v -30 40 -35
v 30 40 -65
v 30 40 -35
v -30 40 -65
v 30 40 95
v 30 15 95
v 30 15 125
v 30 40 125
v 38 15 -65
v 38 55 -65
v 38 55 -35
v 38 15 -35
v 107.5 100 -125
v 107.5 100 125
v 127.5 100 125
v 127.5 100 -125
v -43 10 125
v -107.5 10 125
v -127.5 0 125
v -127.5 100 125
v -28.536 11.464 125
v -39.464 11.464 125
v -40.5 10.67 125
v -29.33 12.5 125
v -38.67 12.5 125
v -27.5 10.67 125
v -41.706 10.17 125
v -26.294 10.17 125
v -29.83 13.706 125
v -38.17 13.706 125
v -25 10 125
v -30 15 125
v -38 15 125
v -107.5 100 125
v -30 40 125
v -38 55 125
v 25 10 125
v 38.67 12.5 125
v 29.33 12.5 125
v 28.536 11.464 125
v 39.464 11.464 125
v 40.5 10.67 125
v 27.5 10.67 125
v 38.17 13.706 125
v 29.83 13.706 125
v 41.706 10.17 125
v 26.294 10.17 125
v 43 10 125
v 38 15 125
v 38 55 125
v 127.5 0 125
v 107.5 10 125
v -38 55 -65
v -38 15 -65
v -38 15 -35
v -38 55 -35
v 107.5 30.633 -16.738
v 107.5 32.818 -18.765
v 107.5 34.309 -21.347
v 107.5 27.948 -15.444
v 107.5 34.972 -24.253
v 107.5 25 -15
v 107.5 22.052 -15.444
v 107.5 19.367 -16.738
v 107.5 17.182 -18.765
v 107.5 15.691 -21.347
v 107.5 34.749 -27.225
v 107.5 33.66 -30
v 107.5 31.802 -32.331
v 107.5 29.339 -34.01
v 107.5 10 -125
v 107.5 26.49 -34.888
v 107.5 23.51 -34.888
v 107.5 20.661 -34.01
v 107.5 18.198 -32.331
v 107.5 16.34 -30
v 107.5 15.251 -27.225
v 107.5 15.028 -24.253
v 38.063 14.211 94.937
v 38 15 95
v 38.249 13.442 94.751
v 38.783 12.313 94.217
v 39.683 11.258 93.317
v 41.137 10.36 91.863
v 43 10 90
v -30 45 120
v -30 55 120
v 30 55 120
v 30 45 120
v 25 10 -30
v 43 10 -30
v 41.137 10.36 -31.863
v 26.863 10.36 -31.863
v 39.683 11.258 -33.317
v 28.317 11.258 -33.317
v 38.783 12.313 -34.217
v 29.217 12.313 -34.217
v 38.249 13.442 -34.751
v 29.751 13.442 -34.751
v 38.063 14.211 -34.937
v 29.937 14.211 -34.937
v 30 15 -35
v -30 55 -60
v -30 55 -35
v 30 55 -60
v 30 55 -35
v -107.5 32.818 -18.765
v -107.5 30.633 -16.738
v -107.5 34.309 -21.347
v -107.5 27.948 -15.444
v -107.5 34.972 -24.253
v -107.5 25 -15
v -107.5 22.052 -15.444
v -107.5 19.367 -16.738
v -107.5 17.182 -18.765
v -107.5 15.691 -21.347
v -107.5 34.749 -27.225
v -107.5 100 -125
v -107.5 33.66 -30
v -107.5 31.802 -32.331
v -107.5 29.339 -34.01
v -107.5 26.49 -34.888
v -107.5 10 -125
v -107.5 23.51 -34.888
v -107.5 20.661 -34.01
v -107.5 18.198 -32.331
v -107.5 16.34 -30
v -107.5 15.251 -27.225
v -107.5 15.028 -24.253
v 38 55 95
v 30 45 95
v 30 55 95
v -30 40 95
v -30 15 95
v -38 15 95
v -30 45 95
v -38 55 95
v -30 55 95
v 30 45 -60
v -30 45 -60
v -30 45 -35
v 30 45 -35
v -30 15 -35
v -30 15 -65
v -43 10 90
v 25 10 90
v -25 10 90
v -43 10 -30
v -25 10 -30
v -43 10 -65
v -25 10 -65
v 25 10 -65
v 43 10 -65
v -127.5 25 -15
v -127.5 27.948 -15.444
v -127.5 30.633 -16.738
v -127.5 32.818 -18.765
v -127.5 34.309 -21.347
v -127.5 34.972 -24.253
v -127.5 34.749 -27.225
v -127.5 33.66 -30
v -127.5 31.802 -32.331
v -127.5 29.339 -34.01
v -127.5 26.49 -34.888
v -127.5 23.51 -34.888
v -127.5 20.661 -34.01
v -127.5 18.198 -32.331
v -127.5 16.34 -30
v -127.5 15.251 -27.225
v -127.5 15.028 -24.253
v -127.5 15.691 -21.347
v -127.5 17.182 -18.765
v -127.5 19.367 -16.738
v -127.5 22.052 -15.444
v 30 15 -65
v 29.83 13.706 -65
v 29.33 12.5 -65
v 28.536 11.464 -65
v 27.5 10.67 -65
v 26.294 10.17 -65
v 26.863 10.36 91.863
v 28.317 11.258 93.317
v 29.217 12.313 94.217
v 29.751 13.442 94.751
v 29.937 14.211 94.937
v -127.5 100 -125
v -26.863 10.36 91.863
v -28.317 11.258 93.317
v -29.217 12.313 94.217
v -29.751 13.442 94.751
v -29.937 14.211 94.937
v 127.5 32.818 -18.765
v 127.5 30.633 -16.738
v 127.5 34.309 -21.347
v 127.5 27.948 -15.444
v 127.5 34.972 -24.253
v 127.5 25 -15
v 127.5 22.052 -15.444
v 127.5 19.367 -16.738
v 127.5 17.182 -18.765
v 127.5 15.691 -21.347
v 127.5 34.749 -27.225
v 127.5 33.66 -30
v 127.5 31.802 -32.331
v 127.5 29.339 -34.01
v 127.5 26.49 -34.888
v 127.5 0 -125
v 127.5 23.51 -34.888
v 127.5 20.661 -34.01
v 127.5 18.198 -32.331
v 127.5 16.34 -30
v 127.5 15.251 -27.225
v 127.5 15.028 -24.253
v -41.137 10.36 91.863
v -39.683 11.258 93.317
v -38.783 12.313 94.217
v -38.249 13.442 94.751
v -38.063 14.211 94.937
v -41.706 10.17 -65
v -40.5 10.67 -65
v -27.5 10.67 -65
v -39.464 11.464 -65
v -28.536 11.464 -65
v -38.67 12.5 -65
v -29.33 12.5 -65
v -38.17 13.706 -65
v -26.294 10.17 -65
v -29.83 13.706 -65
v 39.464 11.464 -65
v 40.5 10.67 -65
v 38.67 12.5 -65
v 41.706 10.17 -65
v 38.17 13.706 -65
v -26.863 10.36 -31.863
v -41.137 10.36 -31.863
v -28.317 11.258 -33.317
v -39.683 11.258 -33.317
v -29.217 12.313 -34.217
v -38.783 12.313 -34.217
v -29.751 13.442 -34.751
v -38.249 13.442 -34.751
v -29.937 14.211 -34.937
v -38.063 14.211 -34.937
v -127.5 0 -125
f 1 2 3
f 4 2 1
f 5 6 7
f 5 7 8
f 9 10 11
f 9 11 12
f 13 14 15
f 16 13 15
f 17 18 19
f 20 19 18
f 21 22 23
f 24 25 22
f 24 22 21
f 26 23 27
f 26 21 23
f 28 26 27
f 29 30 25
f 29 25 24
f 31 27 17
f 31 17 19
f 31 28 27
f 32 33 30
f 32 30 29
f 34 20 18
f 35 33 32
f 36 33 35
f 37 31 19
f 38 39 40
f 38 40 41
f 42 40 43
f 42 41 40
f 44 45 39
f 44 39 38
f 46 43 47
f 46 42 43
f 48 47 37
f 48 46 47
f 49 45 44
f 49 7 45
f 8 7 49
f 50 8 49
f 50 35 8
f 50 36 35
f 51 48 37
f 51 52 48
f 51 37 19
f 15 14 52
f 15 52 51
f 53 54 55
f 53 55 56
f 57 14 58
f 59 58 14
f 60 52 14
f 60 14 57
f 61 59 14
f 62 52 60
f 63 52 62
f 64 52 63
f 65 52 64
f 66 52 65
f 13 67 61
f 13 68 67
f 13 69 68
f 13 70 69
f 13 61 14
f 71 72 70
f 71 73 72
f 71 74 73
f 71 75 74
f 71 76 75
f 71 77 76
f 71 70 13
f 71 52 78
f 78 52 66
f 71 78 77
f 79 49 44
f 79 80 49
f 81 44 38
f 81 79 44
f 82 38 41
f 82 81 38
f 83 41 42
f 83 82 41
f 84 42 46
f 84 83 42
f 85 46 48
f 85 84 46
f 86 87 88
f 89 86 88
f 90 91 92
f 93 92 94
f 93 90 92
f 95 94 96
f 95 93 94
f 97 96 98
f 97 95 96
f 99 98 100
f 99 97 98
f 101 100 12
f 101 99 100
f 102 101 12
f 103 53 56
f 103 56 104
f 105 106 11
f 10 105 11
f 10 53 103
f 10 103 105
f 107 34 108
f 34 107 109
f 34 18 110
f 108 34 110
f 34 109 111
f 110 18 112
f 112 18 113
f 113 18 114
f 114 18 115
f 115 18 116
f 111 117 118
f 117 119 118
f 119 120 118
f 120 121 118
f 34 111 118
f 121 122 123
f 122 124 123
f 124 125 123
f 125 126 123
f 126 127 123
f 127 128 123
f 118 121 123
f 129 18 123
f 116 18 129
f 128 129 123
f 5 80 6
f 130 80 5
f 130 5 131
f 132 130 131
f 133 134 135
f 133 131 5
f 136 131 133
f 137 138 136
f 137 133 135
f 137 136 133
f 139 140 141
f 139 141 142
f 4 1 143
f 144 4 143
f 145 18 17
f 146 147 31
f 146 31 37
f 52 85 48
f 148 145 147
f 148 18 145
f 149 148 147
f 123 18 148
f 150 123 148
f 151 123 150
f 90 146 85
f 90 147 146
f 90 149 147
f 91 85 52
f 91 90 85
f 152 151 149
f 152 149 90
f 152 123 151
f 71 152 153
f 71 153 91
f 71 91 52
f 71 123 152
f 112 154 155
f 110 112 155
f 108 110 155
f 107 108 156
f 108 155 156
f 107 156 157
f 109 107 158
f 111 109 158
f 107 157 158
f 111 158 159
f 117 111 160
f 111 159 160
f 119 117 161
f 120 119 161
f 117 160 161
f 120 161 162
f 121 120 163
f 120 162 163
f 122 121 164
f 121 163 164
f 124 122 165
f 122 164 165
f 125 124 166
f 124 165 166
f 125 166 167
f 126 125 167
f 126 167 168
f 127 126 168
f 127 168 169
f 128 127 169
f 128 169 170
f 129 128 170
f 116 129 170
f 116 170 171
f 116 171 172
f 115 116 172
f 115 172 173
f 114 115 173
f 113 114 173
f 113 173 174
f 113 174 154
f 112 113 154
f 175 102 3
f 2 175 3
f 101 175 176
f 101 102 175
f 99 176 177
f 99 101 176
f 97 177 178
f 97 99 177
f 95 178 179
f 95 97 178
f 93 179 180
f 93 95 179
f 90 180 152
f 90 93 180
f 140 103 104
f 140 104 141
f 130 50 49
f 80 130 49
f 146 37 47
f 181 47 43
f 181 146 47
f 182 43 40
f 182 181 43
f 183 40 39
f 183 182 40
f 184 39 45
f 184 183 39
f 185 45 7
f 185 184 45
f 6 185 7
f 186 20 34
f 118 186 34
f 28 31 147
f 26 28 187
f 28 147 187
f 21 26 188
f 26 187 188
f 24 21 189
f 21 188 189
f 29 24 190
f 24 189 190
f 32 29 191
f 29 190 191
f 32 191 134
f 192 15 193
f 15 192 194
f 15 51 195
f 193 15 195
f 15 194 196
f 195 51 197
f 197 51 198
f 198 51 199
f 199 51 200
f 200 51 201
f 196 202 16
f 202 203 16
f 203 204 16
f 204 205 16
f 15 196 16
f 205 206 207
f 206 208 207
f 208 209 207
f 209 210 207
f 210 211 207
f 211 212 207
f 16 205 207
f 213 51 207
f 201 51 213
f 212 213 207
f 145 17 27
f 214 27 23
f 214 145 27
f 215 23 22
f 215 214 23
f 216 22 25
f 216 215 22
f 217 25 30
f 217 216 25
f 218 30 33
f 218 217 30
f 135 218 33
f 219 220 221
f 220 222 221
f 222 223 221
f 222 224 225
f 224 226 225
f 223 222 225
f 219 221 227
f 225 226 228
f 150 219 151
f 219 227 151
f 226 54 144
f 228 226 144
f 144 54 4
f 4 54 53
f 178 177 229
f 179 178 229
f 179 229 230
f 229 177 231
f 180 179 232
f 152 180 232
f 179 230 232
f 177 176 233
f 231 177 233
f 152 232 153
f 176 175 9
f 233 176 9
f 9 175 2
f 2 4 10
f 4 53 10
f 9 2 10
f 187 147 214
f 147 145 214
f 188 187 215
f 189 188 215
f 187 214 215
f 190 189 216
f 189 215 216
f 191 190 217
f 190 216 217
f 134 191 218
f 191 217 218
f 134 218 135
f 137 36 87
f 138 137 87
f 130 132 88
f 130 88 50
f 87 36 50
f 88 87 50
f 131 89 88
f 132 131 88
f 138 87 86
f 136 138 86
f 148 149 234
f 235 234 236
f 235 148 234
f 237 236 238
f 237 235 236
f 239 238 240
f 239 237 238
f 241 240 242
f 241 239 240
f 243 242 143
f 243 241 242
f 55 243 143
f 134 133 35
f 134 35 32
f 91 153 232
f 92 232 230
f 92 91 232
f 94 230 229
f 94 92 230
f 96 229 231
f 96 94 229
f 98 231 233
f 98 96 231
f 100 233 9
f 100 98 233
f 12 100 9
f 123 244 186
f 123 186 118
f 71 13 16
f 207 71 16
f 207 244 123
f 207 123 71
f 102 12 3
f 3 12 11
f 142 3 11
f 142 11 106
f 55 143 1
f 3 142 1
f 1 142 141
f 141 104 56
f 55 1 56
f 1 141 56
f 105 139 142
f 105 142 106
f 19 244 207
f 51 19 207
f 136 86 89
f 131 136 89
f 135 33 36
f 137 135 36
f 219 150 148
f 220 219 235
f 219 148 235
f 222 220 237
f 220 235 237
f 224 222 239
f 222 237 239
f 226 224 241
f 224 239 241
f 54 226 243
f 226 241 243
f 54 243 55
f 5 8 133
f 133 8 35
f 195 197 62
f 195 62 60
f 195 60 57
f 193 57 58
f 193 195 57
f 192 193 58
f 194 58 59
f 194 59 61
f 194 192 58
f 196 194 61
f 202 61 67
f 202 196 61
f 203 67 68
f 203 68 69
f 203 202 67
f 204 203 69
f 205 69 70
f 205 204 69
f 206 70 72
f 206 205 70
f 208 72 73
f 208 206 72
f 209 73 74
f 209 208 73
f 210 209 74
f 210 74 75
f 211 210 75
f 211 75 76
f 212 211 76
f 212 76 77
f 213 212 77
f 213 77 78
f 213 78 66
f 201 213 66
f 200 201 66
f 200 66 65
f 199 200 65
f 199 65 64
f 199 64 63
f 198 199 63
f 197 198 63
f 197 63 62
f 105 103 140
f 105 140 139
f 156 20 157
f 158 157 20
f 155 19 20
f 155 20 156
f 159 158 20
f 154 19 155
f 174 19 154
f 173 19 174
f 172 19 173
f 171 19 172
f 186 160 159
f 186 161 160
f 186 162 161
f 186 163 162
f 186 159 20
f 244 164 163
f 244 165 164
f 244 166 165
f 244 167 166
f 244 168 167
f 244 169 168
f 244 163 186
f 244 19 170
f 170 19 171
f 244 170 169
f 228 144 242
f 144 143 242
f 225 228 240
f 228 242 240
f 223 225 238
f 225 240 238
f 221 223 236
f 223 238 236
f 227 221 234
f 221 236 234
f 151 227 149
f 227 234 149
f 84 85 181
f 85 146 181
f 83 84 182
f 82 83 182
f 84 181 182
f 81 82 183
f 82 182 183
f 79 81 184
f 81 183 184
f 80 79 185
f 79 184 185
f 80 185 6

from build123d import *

# Parameters (mm, degrees)
SKETCH_4_W             = 255
SKETCH_4_H             = 250
EXTRUDE_2_DEPTH        = 10
SKETCH_7_W             = 20
SKETCH_7_H             = 250
EXTRUDE_3_DEPTH        = 90
EXTRUDE_4_DEPTH        = 30
CUT_EXTRUDE_1_REACH    = 303.081
SKETCH_9_R             = 10
SKETCH_11_W            = 60
SKETCH_11_H            = 10
EXTRUDE_6_DEPTH        = 5
FILLET_1_R             = 5
FILLET_1_OF_MIRROR_2_R = 5


with BuildPart() as part:
    # 草圖4 → 填料-伸長2 (new body)
    with BuildSketch(Plane(origin=(0, 0, 0), x_dir=(1, 0, 0), z_dir=(0, 1, 0))):
        Rectangle(SKETCH_4_W, SKETCH_4_H)
    extrude(amount=EXTRUDE_2_DEPTH)

    # 草圖7 → 填料-伸長3 (add)
    with BuildSketch(Plane(origin=(0, 10, 0), x_dir=(1, 0, 0), z_dir=(0, 1, 0))):
        with Locations((-117.5, 0)):
            Rectangle(SKETCH_7_W, SKETCH_7_H)
        with Locations((117.5, 0)):
            Rectangle(SKETCH_7_W, SKETCH_7_H)
    extrude(amount=EXTRUDE_3_DEPTH)

    # 草圖8 → 填料-伸長4 (add)
    with BuildSketch(Plane.XY.offset(125)):
        Polygon((-30, 10), (-38, 10), (-38, 55), (-30, 55), (-30, 45), (30, 45), (30, 55), (38, 55), (38, 10), (30, 10), (30, 40), (-30, 40), align=None)
    extrude_4 = extrude(amount=-EXTRUDE_4_DEPTH)

    # 草圖9 → 除料-伸長1 (cut, up to next)
    with BuildSketch(Plane.ZY.offset(127.5), mode=Mode.PRIVATE) as cut_extrude_1_sk1:
        with Locations((-25, 25)):
            Circle(SKETCH_9_R)
    cut_extrude_1_tool1 = extrude(cut_extrude_1_sk1.sketch, amount=-CUT_EXTRUDE_1_REACH, mode=Mode.PRIVATE) & part.part
    cut_extrude_1 = cut_extrude_1_tool1.solids().sort_by_distance((-127.5, 25, -25))[0]
    add(cut_extrude_1, mode=Mode.SUBTRACT)

    # 鏡射1: 除料-伸長1 across plane
    add(cut_extrude_1.mirror(Plane(origin=(0, 0, 0), x_dir=(0, 0, 1), z_dir=(1, 0, 0))), mode=Mode.SUBTRACT)

    # 草圖11 → 填料-伸長6 (add)
    with BuildSketch(Plane.XY.offset(125)):
        with Locations((0, 50)):
            Rectangle(SKETCH_11_W, SKETCH_11_H)
    extrude_6 = extrude(amount=-EXTRUDE_6_DEPTH)

    # 圓角1
    fillet_1_edges = [part.edges().sort_by_distance(p)[0] for p in [
        (-34, 10, 95),
        (-30, 10, 110),
        (-38, 10, 110),
        (34, 10, 95),
        (38, 10, 110),
        (30, 10, 110),
    ]]
    fillet(fillet_1_edges, radius=FILLET_1_R)

    # 鏡射2: 填料-伸長4, 填料-伸長6 across plane
    add(extrude_4.mirror(Plane(origin=(0, 0, 30), x_dir=(1, 0, 0), z_dir=(0, 0, -1))))
    add(extrude_6.mirror(Plane(origin=(0, 0, 30), x_dir=(1, 0, 0), z_dir=(0, 0, -1))))

    # 圓角1 of 鏡射2
    fillet_1_of_mirror_2_edges = [part.edges().sort_by_distance(p)[0] for p in [
        (-34, 10, -35),
        (-30, 10, -50),
        (-38, 10, -50),
        (34, 10, -35),
        (38, 10, -50),
        (30, 10, -50),
    ]]
    fillet(fillet_1_of_mirror_2_edges, radius=FILLET_1_OF_MIRROR_2_R)


solid = part.part
